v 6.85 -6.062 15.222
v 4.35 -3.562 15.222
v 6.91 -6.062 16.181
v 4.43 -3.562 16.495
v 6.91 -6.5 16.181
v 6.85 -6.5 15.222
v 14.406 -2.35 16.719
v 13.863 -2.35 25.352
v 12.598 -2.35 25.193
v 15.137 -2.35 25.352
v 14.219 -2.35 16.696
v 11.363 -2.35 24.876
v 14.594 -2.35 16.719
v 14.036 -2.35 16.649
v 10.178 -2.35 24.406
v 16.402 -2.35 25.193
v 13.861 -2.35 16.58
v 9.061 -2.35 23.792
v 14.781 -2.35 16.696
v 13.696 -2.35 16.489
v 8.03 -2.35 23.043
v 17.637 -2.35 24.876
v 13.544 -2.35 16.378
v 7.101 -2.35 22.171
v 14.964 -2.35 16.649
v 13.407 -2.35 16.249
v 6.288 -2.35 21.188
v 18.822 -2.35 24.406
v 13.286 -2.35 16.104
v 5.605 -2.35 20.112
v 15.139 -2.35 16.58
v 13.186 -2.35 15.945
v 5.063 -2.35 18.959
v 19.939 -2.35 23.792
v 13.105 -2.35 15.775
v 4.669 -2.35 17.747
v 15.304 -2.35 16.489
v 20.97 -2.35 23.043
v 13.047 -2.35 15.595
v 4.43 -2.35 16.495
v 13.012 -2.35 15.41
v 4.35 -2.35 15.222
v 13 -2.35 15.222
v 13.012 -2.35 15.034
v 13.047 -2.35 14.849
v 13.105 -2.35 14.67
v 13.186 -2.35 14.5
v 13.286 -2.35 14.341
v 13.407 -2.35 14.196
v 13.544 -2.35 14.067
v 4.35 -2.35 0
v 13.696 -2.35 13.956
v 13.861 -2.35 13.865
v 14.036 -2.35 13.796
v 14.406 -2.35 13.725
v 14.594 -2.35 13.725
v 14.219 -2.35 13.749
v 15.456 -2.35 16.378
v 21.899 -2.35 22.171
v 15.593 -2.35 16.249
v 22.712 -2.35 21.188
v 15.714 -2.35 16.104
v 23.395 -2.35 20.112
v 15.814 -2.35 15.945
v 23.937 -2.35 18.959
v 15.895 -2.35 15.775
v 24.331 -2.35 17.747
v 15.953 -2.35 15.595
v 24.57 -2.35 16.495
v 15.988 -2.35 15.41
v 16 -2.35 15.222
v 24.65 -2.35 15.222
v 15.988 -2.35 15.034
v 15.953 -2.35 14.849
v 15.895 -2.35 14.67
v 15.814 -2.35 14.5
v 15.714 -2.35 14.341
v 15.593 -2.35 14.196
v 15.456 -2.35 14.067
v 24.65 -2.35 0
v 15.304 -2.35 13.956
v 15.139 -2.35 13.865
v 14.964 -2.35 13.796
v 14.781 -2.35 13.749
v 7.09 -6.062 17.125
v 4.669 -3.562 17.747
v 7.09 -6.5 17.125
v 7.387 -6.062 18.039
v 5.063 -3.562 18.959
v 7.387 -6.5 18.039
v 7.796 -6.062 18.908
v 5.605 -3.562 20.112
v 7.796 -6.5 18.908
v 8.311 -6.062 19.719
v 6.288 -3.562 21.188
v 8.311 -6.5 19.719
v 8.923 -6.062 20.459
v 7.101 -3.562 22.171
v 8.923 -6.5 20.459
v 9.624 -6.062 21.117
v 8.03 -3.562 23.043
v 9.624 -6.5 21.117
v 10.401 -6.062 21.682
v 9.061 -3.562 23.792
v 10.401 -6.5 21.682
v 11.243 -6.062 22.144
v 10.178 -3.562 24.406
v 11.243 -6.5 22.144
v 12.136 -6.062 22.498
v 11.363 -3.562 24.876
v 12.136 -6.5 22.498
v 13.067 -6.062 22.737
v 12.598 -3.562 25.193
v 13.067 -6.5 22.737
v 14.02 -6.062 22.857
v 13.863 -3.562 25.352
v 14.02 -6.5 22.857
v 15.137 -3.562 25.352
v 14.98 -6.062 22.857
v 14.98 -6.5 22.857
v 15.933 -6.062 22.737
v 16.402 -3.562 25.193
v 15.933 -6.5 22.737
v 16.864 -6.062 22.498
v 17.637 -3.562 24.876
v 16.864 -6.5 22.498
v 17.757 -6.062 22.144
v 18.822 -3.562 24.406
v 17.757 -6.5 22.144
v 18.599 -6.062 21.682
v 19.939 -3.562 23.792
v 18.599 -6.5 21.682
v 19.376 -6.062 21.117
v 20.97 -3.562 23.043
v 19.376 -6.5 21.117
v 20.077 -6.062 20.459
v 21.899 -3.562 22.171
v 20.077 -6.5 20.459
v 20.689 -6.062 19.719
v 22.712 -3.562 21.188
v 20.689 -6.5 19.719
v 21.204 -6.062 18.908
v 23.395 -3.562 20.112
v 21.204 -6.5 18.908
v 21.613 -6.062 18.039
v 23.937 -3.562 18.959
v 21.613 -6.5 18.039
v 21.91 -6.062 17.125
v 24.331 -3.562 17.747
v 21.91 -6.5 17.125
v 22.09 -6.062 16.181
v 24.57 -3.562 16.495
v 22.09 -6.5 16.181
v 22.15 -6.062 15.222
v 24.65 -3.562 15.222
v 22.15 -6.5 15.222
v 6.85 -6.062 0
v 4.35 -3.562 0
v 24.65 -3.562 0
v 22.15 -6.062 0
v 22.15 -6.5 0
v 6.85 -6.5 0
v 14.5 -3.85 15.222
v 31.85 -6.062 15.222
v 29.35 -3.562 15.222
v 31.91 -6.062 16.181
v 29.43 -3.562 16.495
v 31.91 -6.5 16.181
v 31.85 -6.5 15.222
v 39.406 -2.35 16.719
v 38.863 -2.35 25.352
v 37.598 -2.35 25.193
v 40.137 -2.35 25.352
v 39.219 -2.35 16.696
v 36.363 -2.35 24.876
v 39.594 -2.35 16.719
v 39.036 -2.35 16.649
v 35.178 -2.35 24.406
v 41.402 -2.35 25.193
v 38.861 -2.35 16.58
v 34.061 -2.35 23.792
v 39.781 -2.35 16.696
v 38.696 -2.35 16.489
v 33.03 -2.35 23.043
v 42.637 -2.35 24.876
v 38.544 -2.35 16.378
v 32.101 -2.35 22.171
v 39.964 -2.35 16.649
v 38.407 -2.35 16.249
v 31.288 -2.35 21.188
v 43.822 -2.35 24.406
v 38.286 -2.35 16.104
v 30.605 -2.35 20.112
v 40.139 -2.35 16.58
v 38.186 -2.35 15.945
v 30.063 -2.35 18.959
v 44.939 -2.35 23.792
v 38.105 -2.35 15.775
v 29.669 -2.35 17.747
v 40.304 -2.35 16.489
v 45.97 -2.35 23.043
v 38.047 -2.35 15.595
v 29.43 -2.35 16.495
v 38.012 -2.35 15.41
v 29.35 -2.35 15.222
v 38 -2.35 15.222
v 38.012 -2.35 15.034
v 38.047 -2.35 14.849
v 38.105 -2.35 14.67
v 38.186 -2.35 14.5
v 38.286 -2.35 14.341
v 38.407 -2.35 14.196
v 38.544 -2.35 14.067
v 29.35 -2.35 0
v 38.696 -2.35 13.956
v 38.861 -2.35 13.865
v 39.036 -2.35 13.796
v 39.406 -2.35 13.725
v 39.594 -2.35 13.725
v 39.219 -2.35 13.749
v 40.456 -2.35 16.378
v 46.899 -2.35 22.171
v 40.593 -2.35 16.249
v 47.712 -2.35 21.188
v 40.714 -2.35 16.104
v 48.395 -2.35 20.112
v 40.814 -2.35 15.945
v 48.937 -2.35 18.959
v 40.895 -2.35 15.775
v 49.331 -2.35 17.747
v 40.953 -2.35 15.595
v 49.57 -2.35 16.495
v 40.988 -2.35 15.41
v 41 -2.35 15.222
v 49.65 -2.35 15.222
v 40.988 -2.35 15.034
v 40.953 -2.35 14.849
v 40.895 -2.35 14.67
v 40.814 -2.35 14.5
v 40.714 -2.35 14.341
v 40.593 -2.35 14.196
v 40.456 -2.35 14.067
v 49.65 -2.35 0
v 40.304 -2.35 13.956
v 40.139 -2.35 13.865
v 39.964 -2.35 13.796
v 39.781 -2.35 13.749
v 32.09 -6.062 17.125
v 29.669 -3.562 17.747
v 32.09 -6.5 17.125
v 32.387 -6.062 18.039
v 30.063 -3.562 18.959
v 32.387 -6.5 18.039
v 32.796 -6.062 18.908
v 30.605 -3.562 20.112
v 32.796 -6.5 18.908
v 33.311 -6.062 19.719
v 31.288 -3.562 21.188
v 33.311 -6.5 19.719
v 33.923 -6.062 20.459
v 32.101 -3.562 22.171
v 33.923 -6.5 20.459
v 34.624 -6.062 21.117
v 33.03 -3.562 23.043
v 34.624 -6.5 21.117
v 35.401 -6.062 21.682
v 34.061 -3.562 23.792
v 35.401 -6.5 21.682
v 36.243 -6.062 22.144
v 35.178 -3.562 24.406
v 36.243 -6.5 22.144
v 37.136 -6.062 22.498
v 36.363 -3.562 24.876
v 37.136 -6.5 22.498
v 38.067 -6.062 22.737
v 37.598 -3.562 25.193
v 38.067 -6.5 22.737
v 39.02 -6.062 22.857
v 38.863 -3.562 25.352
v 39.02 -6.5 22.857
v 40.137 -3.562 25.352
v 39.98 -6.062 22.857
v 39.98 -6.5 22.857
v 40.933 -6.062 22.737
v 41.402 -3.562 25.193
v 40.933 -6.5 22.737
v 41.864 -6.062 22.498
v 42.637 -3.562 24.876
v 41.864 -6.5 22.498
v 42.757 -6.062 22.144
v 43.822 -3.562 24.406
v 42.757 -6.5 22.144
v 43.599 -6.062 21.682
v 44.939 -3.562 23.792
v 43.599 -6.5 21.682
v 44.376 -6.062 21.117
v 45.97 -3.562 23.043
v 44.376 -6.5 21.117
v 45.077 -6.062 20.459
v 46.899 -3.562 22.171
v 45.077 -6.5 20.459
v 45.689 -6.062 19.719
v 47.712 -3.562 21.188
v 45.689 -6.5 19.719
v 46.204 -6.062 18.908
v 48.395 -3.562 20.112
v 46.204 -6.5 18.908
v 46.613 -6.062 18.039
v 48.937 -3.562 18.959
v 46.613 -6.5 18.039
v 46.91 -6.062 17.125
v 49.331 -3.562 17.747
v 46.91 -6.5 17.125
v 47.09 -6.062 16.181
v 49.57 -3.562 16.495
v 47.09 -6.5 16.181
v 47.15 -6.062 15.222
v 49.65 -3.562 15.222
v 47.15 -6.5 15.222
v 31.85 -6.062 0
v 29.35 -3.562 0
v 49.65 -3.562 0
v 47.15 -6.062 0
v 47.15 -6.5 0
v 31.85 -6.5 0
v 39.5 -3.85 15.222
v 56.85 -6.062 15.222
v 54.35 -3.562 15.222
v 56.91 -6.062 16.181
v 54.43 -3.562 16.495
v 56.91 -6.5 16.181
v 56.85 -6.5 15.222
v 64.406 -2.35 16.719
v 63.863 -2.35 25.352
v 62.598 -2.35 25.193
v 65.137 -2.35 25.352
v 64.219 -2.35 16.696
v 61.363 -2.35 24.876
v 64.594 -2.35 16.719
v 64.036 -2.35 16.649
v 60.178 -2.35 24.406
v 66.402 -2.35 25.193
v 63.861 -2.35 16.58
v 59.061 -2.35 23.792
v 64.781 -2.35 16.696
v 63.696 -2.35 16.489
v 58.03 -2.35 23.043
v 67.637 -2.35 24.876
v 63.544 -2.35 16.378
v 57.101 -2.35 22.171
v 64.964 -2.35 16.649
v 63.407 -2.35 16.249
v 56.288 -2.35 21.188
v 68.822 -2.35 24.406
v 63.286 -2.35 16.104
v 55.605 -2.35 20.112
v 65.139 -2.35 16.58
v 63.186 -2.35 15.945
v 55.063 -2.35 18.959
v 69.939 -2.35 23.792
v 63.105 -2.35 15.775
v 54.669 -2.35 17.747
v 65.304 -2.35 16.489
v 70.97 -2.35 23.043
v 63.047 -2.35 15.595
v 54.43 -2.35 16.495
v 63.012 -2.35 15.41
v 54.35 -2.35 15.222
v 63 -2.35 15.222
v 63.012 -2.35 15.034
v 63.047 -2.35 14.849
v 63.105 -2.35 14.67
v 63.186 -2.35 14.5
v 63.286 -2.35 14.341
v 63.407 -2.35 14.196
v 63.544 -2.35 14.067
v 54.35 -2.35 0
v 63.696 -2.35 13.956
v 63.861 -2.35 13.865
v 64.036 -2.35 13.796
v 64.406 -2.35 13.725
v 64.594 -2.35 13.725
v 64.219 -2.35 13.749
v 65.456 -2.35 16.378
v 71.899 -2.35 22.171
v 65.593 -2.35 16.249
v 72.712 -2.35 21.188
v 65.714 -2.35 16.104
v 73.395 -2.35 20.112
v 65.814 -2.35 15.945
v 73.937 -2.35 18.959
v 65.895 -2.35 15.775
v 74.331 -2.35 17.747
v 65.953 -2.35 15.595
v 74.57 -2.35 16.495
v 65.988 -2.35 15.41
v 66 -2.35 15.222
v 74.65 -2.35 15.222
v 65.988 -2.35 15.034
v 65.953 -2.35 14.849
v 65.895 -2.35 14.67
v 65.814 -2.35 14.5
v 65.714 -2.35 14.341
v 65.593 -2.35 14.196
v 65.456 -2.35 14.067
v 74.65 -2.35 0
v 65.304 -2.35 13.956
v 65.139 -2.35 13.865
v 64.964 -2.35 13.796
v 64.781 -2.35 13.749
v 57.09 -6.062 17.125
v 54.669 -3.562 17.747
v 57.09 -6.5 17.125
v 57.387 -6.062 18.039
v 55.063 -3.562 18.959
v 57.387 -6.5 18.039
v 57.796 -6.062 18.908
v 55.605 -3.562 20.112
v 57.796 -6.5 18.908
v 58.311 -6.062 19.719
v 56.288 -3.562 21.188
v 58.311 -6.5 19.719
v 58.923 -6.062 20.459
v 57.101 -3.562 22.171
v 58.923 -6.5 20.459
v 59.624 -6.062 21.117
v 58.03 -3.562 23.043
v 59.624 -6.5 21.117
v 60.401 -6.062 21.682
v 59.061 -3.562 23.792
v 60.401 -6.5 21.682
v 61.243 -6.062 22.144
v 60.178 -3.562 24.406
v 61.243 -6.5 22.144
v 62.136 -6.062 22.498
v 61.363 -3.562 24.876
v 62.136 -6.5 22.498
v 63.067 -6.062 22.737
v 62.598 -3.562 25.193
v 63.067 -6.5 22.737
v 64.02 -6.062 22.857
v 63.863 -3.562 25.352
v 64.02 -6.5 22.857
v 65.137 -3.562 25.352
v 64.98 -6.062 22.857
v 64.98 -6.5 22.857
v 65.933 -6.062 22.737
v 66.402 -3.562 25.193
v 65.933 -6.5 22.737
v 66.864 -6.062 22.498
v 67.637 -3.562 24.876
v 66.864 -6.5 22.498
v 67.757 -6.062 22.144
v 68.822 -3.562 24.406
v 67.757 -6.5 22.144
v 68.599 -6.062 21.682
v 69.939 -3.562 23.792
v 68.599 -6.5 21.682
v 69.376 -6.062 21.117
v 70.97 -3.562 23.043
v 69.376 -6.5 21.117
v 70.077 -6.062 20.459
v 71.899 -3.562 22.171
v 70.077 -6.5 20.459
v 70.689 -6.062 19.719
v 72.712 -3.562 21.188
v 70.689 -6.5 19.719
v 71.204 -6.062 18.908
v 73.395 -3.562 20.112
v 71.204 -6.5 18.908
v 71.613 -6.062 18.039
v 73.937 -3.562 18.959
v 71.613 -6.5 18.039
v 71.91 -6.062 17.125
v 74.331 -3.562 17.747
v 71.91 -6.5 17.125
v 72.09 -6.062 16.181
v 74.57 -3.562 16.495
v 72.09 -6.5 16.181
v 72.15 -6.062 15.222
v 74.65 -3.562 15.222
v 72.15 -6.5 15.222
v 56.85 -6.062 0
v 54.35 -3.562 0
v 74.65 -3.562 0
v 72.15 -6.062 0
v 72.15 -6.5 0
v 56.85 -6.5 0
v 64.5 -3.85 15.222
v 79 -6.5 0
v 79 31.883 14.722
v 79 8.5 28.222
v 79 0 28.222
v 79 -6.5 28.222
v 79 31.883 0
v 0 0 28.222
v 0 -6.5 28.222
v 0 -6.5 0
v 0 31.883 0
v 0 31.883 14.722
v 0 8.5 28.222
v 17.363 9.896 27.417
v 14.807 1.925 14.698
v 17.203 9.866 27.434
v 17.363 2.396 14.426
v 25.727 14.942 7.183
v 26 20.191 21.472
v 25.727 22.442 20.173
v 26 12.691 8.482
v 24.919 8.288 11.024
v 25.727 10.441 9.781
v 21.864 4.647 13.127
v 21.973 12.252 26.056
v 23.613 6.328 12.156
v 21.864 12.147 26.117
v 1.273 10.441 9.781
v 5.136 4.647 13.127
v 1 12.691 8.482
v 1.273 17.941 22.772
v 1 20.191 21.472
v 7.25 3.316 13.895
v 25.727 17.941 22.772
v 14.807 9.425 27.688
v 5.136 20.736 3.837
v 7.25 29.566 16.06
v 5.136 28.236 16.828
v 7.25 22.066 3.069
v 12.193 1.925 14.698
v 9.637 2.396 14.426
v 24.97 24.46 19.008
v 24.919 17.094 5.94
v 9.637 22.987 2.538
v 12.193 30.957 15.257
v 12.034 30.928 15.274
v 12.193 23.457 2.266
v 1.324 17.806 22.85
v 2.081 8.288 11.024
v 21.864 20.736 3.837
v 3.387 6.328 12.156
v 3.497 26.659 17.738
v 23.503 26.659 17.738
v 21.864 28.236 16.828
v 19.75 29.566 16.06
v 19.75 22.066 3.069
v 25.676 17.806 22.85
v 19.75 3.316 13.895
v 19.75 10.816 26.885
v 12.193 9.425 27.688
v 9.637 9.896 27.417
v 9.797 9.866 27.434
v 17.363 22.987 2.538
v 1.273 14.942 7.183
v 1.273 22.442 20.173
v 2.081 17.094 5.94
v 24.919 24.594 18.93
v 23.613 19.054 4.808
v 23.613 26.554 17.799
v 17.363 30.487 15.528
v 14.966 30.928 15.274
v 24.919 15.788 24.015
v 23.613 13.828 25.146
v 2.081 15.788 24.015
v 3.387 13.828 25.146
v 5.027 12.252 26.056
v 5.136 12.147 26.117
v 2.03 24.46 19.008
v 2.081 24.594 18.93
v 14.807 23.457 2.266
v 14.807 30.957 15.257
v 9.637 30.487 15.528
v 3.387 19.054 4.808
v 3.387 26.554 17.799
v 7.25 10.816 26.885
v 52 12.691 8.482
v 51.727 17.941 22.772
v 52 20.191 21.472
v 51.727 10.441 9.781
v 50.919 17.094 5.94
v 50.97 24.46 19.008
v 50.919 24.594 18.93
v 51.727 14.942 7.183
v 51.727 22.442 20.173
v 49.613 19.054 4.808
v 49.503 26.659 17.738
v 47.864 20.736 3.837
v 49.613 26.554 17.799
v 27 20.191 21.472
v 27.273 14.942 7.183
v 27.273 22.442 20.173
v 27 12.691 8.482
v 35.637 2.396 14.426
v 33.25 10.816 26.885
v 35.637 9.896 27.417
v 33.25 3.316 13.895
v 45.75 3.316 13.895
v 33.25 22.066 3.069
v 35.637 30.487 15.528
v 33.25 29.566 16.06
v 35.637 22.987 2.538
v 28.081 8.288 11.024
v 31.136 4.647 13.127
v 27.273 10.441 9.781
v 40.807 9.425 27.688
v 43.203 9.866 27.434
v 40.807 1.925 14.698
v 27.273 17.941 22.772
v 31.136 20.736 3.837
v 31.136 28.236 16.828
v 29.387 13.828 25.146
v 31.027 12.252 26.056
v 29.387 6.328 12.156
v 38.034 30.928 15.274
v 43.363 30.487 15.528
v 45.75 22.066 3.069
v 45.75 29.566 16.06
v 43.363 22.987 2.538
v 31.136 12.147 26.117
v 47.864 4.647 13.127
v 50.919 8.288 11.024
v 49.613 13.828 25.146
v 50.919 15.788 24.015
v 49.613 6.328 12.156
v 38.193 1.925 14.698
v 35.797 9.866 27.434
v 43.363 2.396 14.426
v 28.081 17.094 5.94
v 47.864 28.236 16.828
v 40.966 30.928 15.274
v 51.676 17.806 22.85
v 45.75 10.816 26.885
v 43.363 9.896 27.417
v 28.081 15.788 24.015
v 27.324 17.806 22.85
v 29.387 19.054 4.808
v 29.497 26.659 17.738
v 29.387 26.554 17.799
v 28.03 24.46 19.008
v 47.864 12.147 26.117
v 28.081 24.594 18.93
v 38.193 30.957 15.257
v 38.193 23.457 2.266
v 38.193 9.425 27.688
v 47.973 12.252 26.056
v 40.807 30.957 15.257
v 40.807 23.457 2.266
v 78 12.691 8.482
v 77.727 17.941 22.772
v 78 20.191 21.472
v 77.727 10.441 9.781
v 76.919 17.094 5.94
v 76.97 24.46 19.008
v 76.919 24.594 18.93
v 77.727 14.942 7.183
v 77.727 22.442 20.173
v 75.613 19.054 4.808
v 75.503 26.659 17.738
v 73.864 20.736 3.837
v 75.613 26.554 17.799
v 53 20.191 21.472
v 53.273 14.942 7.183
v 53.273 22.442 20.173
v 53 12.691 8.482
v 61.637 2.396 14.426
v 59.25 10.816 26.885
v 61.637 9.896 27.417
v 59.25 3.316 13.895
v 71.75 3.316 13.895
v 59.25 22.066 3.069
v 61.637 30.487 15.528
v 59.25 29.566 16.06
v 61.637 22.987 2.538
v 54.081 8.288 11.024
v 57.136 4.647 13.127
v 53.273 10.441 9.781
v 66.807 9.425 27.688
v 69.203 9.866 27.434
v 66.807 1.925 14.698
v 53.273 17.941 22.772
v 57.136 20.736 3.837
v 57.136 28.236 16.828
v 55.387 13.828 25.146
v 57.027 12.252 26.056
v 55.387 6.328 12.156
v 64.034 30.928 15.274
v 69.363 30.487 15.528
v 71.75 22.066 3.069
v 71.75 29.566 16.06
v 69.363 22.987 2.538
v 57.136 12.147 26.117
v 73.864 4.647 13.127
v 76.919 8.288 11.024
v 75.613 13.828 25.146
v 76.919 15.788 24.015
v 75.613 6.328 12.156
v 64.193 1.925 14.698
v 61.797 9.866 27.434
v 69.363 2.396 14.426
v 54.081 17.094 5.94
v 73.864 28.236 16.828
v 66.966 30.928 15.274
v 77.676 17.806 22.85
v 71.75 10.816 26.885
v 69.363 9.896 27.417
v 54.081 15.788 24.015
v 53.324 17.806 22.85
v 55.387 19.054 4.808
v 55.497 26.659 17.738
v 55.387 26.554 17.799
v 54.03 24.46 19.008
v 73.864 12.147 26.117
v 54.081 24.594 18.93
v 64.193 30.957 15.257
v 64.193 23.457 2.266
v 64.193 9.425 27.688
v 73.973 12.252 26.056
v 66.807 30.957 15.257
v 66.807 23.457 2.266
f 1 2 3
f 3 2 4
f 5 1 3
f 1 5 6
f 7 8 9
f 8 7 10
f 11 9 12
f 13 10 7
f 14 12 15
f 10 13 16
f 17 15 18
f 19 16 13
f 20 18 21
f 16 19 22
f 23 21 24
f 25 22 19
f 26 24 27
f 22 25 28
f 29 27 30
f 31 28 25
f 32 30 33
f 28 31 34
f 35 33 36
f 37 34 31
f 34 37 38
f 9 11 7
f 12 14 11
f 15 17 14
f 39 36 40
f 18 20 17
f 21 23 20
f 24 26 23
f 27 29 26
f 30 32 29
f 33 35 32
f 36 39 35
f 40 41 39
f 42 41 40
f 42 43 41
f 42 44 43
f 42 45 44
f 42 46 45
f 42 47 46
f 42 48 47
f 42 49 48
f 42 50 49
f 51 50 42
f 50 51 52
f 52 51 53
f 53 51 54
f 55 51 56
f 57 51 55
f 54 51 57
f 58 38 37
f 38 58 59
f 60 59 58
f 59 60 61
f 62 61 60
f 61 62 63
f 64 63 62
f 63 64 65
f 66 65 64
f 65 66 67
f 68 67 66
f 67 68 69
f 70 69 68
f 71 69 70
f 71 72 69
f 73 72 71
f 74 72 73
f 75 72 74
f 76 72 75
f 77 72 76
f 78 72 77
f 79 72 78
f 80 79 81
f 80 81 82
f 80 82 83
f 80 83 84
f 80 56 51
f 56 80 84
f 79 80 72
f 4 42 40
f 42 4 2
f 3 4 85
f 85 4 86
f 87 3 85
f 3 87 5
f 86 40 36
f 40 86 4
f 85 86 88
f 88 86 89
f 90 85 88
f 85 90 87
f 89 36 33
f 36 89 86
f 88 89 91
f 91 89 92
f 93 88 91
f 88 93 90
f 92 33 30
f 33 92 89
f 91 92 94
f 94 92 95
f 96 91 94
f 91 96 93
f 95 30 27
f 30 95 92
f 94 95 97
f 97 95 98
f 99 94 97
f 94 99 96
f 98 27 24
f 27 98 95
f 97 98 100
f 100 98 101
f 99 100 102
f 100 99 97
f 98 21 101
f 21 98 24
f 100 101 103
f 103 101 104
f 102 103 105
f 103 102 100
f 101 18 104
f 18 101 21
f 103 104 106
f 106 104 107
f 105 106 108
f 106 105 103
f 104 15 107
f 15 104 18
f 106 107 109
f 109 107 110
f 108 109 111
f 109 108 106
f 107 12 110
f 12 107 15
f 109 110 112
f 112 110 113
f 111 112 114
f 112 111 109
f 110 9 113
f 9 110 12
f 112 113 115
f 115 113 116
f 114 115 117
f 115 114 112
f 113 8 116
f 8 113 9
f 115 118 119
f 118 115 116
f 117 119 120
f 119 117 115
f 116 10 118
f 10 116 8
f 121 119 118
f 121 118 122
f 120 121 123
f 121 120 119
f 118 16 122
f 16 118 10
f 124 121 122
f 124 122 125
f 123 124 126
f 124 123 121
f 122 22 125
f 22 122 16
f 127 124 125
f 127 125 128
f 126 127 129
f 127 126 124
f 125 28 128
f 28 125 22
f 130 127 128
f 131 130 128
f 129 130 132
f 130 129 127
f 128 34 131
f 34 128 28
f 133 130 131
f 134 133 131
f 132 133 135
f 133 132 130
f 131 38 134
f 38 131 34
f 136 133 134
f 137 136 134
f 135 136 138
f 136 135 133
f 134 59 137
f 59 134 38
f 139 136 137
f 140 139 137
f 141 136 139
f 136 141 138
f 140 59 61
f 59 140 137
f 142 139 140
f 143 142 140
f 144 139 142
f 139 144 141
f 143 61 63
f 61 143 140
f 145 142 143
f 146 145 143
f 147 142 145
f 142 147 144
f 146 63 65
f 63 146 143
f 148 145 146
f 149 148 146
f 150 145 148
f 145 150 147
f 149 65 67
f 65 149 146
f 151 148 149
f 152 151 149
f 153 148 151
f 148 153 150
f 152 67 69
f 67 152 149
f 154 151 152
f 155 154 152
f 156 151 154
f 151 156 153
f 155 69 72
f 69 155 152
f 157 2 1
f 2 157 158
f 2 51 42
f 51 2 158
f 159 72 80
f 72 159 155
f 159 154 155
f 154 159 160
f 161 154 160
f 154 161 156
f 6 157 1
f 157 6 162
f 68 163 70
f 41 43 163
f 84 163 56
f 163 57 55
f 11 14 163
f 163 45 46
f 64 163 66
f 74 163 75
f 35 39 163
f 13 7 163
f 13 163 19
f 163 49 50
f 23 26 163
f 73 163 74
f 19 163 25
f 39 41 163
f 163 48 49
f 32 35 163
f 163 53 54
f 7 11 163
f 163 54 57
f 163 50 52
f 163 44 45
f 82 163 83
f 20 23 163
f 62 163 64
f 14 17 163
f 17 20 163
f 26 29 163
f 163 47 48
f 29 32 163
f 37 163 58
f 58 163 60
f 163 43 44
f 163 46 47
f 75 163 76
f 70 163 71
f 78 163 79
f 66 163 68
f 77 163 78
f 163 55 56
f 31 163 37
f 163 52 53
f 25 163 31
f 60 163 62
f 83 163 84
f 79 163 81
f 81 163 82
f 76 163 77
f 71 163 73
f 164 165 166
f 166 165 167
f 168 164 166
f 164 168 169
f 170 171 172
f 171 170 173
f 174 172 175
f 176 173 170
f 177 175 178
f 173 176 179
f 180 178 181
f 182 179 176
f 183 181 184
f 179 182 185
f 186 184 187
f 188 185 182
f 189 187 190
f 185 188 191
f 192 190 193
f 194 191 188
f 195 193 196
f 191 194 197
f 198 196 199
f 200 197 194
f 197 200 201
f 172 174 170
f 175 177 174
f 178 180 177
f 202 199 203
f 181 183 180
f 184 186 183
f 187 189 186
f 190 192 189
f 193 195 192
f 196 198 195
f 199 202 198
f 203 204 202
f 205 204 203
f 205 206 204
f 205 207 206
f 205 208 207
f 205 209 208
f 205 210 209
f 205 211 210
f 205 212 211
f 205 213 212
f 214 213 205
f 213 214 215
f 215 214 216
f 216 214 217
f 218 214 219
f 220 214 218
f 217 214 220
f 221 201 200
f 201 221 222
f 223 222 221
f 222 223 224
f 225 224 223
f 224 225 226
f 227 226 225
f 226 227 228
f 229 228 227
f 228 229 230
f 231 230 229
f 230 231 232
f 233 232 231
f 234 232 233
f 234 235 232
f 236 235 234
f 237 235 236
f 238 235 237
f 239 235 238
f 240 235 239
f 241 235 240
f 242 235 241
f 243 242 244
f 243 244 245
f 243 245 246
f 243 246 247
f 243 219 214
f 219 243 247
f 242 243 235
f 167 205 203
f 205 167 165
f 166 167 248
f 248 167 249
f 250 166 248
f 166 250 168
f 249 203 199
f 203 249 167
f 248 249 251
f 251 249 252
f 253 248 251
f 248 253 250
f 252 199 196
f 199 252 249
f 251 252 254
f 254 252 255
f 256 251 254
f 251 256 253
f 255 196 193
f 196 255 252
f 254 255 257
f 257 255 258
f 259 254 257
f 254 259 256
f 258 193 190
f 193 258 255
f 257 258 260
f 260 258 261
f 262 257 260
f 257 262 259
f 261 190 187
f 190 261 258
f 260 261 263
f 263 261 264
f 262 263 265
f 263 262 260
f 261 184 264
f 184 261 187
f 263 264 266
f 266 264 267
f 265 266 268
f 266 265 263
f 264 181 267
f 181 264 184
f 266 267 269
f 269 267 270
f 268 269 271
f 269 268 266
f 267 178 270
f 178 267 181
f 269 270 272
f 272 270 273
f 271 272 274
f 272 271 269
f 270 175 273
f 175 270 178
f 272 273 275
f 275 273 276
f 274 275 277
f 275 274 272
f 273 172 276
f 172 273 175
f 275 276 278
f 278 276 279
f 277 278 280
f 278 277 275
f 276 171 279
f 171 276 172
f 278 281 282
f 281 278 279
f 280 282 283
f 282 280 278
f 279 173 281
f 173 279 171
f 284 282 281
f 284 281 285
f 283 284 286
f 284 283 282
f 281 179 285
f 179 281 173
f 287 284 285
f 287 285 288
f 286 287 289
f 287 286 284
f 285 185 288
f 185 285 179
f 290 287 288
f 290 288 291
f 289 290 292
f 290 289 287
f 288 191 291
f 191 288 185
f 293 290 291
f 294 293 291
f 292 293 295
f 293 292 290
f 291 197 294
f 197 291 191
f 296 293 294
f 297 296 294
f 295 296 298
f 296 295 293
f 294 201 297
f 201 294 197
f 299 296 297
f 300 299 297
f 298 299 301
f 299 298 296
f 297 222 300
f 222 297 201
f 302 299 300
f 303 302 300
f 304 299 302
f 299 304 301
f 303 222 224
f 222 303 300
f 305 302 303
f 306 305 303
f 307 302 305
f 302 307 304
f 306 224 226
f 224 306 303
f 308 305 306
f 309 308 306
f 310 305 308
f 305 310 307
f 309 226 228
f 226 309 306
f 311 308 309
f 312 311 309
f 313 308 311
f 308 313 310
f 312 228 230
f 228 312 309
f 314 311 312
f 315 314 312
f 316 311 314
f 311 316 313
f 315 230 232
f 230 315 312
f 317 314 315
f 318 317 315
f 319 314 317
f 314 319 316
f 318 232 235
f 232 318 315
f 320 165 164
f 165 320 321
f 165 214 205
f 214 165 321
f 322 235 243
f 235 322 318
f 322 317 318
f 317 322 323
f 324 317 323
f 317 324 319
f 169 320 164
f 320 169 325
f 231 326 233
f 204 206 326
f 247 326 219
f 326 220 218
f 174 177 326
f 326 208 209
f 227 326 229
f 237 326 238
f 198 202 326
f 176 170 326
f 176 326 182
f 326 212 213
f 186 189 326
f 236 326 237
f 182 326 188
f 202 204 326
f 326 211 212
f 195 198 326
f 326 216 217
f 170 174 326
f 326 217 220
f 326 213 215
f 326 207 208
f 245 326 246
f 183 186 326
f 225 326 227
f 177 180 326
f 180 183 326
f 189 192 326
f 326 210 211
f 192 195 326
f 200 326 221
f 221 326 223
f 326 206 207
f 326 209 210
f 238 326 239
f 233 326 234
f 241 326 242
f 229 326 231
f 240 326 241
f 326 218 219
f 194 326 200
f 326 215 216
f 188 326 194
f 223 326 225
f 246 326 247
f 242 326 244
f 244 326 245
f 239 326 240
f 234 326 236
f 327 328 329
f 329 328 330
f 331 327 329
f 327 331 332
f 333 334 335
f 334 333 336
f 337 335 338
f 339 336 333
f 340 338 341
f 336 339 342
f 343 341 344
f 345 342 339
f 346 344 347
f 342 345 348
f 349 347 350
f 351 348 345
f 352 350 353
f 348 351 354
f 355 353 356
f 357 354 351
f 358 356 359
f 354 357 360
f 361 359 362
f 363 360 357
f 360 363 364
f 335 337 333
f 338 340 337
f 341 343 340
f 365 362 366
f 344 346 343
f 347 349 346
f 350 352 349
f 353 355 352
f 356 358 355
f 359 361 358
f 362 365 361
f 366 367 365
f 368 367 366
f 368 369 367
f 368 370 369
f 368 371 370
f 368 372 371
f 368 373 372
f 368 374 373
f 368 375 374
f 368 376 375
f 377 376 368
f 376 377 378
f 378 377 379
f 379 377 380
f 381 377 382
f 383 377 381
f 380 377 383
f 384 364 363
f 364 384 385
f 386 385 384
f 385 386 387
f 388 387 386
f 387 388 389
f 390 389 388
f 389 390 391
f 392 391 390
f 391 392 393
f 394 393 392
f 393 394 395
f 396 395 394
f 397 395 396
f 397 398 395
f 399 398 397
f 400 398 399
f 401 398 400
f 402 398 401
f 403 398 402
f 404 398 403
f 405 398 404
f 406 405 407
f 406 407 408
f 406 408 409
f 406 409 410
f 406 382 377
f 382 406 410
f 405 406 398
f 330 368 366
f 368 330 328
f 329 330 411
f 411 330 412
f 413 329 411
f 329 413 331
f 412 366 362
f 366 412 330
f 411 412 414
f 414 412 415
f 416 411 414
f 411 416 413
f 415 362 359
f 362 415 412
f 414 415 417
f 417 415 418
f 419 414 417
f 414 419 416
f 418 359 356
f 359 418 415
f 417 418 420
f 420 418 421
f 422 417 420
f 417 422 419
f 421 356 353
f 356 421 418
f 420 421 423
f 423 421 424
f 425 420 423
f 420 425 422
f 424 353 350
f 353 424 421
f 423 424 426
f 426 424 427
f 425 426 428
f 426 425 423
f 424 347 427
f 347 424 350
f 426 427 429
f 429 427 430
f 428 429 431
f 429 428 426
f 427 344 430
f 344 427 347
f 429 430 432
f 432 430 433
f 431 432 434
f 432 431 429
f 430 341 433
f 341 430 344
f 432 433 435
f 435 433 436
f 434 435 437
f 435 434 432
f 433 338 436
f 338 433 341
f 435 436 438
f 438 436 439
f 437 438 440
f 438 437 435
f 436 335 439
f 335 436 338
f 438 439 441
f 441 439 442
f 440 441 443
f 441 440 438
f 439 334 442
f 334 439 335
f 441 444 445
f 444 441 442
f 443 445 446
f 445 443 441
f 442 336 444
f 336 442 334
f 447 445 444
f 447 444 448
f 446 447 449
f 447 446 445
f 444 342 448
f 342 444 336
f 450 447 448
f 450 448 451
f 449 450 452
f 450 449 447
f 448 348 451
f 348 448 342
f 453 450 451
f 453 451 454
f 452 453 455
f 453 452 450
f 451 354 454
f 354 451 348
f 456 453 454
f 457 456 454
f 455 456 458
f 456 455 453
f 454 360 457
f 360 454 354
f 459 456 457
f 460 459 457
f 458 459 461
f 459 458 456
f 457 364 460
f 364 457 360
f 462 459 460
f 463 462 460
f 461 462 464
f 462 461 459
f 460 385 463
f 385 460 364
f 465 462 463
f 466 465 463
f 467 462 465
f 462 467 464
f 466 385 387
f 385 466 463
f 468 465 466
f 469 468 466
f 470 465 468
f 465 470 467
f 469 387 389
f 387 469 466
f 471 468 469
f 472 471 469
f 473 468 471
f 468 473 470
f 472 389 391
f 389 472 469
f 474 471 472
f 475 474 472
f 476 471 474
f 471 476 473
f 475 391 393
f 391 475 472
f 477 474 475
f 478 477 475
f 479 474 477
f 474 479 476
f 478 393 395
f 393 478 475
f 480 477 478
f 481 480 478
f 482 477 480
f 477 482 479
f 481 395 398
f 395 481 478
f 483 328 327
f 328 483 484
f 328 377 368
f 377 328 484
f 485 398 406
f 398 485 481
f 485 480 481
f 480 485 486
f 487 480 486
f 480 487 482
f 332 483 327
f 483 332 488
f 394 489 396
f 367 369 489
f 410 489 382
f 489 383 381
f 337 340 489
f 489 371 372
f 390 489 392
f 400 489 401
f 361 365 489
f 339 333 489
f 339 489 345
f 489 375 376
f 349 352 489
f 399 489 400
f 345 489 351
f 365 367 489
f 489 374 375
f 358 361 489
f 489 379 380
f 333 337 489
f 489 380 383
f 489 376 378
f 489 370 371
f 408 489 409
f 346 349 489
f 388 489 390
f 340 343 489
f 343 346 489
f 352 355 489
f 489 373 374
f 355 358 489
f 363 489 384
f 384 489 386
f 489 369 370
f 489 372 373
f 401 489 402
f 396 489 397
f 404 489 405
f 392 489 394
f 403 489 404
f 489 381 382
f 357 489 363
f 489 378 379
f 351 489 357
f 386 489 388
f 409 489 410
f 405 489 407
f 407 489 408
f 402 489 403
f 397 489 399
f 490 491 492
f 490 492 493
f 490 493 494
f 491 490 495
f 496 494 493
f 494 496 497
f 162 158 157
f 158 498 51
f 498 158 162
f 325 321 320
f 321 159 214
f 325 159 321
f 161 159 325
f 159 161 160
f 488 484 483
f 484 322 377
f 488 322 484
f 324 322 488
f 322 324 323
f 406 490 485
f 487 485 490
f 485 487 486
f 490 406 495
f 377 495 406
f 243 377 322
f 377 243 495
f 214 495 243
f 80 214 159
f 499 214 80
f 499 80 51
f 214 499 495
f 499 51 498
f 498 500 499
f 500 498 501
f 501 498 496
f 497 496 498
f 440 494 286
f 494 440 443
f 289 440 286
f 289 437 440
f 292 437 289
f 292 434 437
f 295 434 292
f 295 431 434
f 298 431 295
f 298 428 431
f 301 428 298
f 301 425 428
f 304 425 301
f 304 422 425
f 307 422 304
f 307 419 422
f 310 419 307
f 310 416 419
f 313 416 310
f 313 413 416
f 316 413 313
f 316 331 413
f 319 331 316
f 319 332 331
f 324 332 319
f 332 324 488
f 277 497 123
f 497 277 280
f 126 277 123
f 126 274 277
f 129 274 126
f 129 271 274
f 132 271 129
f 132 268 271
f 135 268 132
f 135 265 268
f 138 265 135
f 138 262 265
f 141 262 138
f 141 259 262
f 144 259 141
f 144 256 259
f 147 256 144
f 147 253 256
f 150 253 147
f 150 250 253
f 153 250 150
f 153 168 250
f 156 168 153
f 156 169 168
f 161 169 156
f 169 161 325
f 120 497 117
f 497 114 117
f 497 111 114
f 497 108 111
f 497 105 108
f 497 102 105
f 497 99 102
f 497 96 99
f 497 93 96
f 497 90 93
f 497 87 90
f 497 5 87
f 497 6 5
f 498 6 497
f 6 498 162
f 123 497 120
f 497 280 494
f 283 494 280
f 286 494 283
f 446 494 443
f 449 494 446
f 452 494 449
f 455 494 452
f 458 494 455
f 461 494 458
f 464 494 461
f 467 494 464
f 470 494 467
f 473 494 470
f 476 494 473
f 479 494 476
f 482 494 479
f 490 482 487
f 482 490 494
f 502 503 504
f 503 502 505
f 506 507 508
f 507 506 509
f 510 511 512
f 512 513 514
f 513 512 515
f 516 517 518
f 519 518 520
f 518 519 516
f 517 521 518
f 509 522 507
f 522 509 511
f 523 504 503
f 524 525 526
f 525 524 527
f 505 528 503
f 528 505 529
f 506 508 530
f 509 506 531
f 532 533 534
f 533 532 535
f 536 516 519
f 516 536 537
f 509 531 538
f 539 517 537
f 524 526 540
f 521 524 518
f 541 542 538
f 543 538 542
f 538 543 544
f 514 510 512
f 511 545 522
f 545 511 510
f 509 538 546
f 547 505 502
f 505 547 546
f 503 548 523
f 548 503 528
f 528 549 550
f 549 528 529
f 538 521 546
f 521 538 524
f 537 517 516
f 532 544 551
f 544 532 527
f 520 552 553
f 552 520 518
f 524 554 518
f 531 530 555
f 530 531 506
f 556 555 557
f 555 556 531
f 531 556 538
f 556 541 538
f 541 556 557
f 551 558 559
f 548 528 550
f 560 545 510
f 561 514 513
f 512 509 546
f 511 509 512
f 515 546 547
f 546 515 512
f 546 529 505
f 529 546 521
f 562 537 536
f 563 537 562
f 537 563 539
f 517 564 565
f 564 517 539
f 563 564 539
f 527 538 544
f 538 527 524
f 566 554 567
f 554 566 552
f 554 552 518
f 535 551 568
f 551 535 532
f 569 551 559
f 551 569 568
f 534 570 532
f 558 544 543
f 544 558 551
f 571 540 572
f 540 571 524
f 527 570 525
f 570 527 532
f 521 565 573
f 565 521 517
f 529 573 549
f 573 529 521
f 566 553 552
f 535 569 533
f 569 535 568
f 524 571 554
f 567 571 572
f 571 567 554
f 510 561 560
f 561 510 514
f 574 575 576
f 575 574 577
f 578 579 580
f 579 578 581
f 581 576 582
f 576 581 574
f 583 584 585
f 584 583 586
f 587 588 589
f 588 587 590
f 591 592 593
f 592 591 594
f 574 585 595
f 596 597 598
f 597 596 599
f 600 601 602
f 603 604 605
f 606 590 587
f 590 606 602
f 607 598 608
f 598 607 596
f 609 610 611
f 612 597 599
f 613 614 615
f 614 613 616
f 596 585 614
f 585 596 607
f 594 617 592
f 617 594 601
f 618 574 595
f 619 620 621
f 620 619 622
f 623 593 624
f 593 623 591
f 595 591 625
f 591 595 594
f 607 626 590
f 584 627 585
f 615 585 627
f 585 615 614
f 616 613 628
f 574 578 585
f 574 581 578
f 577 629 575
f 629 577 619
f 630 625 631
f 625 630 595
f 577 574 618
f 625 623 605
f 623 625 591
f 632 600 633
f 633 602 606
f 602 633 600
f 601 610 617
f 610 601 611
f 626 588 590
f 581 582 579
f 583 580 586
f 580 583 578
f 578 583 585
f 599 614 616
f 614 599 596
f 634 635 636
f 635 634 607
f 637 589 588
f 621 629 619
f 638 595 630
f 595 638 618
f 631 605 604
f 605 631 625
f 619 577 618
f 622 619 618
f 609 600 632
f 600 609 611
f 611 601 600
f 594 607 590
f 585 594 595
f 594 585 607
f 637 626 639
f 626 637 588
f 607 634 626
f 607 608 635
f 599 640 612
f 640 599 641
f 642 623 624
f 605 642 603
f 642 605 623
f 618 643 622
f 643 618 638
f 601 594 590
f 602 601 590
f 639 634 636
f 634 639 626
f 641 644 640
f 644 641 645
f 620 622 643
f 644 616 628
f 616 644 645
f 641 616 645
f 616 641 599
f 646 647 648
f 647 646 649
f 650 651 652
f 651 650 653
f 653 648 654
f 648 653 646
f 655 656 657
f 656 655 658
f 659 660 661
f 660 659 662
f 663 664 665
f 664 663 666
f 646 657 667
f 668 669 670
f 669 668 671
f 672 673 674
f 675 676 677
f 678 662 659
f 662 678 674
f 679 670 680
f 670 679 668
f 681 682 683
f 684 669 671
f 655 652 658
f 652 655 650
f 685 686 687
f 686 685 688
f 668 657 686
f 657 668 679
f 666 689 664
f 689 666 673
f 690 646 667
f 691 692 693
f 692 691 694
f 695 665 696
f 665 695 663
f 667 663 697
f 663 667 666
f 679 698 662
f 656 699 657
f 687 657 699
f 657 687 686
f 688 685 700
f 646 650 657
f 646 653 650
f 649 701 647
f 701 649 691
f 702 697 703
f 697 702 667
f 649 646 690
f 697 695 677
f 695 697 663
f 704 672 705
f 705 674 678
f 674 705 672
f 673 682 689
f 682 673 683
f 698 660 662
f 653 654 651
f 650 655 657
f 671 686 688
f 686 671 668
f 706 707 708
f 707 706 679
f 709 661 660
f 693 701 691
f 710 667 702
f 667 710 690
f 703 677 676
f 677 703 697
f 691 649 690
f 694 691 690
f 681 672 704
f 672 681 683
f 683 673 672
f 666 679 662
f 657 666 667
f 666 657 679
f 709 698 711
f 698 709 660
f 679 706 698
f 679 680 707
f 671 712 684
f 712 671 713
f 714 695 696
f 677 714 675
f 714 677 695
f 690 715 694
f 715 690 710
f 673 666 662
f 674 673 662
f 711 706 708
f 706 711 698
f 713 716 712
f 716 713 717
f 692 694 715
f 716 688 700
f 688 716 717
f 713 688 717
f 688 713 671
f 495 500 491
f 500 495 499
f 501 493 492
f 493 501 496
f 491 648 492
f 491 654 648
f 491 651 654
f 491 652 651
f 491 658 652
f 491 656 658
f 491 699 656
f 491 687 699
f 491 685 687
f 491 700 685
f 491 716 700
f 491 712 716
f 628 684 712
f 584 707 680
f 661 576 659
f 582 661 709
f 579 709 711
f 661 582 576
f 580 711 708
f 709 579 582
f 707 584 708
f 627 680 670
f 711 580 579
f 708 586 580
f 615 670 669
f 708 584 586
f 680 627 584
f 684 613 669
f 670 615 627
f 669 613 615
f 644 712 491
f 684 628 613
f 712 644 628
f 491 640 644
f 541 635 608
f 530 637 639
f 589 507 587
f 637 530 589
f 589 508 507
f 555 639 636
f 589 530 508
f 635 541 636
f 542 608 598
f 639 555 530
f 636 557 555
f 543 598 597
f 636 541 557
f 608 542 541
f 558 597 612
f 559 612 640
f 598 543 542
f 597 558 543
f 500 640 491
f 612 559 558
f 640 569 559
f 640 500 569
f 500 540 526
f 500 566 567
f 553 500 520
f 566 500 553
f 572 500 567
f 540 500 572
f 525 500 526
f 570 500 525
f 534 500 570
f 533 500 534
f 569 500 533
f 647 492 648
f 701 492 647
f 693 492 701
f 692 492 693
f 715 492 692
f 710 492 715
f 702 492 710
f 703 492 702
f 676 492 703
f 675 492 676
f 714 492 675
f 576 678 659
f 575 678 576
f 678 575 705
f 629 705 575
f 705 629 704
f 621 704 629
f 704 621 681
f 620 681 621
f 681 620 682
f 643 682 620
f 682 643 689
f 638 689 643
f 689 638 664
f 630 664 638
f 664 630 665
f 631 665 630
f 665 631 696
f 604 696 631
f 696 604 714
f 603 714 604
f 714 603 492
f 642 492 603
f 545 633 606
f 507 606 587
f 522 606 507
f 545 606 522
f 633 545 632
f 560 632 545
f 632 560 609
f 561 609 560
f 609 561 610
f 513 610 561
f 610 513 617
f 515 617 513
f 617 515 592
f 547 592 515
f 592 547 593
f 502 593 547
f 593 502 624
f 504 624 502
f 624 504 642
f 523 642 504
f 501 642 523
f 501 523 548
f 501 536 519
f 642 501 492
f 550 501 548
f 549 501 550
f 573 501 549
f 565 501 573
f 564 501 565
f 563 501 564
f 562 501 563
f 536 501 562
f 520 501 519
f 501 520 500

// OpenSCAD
/*Created by Andy Levesque
Credit to @David D on Printables and Jonathan at Keep Making for Multiconnect and Multiboard, respectively
Licensed Creative Commons 4.0 Attribution Non-Commercial Sharable with Attribution
*/

/*
TODO: 
    Important: Fix hull issue when angle is less than 20
    - Cap print angle to 45 when item angle exceeds 45
    - Separate distanceBetweenEach and front/back thickness
    - Fix backer height for high diameter items
    - Clean up unused parameters
*/

/*[Standard Parameters]*/
//diameter (in mm) of the item you wish to insert (this becomes the internal diameter)
itemDiameter = 25;
//number of items you wish to hold width-wise (along the back)
itemsWide = 3;
//distance between each item (in mm)
distanceBetweenEach = 1;
//Minimum thickness (in mm) of the base underneath the item you are holding
baseThickness = 2;
//Angle for items
itemAngle = 30; //[0:2.5:60]
//Additional height (in mm) of the rim protruding upward to hold the item
holeDepth = 15;
//Additional Backer Height (in mm) in case you prefer additional support for something heavy
additionalBackerHeight = 0;


/* [Slot Customization] */
//Distance between Multiconnect slots on the back (25mm is standard for MultiBoard)
distanceBetweenSlots = 25;
//QuickRelease removes the small indent in the top of the slots that lock the part into place
slotQuickRelease = false;
//Dimple scale tweaks the size of the dimple in the slot for printers that need a larger dimple to print correctly
dimpleScale = 1; //[0.5:.05:1.5]
//Scale of slots in the back (1.015 scale is default per MultiConnect specs)
slotTolerance = 1.00; //[0.925:0.005:1.075]
//Move the slot in (positive) or out (negative)
slotDepthMicroadjustment = 0; //[-.5:0.05:.5]


/*[Hidden]*/
//number of items you wish to hold depth-wise (away from back)
itemsDeep = 1;
//fit items plus 
totalWidth = itemDiameter*itemsWide + distanceBetweenEach*itemsWide + distanceBetweenEach;
//profile coordinates for the multiconnect slot
slotProfile = [[0,0],[10.15,0],[10.15,1.2121],[7.65,3.712],[7.65,5],[0,5]];


rowDepth = itemDiameter+distanceBetweenEach*2;
//inputs the row depth and desired angle to calculate the height of the back
rowBackHeight = rowDepth * tan(itemAngle);

//Thickness of the back of the item (default in 6.5mm). Changes are untested. 
backThickness = 6.5; //.1
//slot count calculates how many slots can fit on the back. Based on internal width for buffer.
slotCount = floor(max(distanceBetweenSlots,totalWidth)/distanceBetweenSlots);
echo(str("Slot Count: ",slotCount));
backWidth = max(distanceBetweenSlots,totalWidth);

//this is why I should have paid attention in trig...
hypotenuse = rowDepth;
smallHypotenuse = holeDepth+baseThickness;
triangleY = min(sin(itemAngle)*hypotenuse,tan(itemAngle)*hypotenuse);
triangleX = min(cos(itemAngle)*hypotenuse,tan(itemAngle)*hypotenuse);
smallTriangleY = min(sin(itemAngle)*smallHypotenuse,tan(itemAngle)*smallHypotenuse);
smallTriangleX = min(cos(itemAngle)*smallHypotenuse,tan(itemAngle)*smallHypotenuse);
inverseSmallTriangleY = min(sin(90-itemAngle)*smallHypotenuse,tan(90-itemAngle)*smallHypotenuse);
inverseSmallTriangleX = min(cos(90-itemAngle)*smallHypotenuse,tan(90-itemAngle)*smallHypotenuse);
shelfDepth = max(cos(itemAngle)*hypotenuse) + smallTriangleY;
shelfFrontHeight = inverseSmallTriangleY;
shelfBackHeight = triangleY+inverseSmallTriangleY;
totalHeight = max(triangleY+inverseSmallTriangleY,25);


echo(str("hypotenuse: ", hypotenuse))
//start build
multiconnectBack(backWidth = backWidth, backHeight = totalHeight+additionalBackerHeight);
    //craft the 5-sided outline for the shelf that accomodates the desired angle and depth
difference() {
    translate(v = [0,0,0]) rotate(a = [90,0,90]) 
        linear_extrude(height = totalWidth) 
            polygon(points = [[0,0],[0,shelfBackHeight],[smallTriangleY,shelfBackHeight],[shelfDepth,shelfFrontHeight],[shelfDepth,0]]);
    //delete tools
    for(itemY = [0:1:itemsDeep-1]){
        for (itemX = [0:1:itemsWide-1]){
            translate(v = [0,0,triangleY])     
                rotate([-itemAngle,0,0]) {
                    //shelf
                    //cube(size = [totalWidth, rowDepth,holeDepth+baseThickness]);
                    //delete tools
                    translate(v = [itemDiameter/2+distanceBetweenEach + (itemX*itemDiameter+distanceBetweenEach*itemX),itemY*rowDepth+itemDiameter/2+distanceBetweenEach,baseThickness]) 
                        color(c = "red") cylinder(h = holeDepth+1, r = itemDiameter/2);
                }
        }
    }
}

//BEGIN MODULES
//Slotted back
module multiconnectBack(backWidth, backHeight)
{
    difference() {
        translate(v = [0,-6.5,0]) cube(size = [backWidth,6.5,backHeight]);
        //Loop through slots and center on the item
        //Note: I kept doing math until it looked right. It's possible this can be simplified.
        for (slotNum = [0:1:slotCount-1]) {
            translate(v = [distanceBetweenSlots/2+(backWidth/distanceBetweenSlots-slotCount)*distanceBetweenSlots/2+slotNum*distanceBetweenSlots,-2.35+slotDepthMicroadjustment,backHeight-13]) {
                color(c = "red")  slotTool(backHeight);
            }
        }
    }
    //Create Slot Tool
    module slotTool(totalHeight) {
        scale(v = slotTolerance)
        difference() {
            union() {
                //round top
                rotate(a = [90,0,0,]) 
                    rotate_extrude($fn=50) 
                        polygon(points = slotProfile);
                //long slot
                translate(v = [0,0,0]) 
                    rotate(a = [180,0,0]) 
                    linear_extrude(height = totalHeight+1) 
                        union(){
                            polygon(points = slotProfile);
                            mirror([1,0,0])
                                polygon(points = slotProfile);
                        }
            }
            //dimple
            if (slotQuickRelease == false)
                scale(v = dimpleScale) 
                rotate(a = [90,0,0,]) 
                    rotate_extrude($fn=50) 
                        polygon(points = [[0,0],[0,1.5],[1.5,0]]);
        }
    }
}
